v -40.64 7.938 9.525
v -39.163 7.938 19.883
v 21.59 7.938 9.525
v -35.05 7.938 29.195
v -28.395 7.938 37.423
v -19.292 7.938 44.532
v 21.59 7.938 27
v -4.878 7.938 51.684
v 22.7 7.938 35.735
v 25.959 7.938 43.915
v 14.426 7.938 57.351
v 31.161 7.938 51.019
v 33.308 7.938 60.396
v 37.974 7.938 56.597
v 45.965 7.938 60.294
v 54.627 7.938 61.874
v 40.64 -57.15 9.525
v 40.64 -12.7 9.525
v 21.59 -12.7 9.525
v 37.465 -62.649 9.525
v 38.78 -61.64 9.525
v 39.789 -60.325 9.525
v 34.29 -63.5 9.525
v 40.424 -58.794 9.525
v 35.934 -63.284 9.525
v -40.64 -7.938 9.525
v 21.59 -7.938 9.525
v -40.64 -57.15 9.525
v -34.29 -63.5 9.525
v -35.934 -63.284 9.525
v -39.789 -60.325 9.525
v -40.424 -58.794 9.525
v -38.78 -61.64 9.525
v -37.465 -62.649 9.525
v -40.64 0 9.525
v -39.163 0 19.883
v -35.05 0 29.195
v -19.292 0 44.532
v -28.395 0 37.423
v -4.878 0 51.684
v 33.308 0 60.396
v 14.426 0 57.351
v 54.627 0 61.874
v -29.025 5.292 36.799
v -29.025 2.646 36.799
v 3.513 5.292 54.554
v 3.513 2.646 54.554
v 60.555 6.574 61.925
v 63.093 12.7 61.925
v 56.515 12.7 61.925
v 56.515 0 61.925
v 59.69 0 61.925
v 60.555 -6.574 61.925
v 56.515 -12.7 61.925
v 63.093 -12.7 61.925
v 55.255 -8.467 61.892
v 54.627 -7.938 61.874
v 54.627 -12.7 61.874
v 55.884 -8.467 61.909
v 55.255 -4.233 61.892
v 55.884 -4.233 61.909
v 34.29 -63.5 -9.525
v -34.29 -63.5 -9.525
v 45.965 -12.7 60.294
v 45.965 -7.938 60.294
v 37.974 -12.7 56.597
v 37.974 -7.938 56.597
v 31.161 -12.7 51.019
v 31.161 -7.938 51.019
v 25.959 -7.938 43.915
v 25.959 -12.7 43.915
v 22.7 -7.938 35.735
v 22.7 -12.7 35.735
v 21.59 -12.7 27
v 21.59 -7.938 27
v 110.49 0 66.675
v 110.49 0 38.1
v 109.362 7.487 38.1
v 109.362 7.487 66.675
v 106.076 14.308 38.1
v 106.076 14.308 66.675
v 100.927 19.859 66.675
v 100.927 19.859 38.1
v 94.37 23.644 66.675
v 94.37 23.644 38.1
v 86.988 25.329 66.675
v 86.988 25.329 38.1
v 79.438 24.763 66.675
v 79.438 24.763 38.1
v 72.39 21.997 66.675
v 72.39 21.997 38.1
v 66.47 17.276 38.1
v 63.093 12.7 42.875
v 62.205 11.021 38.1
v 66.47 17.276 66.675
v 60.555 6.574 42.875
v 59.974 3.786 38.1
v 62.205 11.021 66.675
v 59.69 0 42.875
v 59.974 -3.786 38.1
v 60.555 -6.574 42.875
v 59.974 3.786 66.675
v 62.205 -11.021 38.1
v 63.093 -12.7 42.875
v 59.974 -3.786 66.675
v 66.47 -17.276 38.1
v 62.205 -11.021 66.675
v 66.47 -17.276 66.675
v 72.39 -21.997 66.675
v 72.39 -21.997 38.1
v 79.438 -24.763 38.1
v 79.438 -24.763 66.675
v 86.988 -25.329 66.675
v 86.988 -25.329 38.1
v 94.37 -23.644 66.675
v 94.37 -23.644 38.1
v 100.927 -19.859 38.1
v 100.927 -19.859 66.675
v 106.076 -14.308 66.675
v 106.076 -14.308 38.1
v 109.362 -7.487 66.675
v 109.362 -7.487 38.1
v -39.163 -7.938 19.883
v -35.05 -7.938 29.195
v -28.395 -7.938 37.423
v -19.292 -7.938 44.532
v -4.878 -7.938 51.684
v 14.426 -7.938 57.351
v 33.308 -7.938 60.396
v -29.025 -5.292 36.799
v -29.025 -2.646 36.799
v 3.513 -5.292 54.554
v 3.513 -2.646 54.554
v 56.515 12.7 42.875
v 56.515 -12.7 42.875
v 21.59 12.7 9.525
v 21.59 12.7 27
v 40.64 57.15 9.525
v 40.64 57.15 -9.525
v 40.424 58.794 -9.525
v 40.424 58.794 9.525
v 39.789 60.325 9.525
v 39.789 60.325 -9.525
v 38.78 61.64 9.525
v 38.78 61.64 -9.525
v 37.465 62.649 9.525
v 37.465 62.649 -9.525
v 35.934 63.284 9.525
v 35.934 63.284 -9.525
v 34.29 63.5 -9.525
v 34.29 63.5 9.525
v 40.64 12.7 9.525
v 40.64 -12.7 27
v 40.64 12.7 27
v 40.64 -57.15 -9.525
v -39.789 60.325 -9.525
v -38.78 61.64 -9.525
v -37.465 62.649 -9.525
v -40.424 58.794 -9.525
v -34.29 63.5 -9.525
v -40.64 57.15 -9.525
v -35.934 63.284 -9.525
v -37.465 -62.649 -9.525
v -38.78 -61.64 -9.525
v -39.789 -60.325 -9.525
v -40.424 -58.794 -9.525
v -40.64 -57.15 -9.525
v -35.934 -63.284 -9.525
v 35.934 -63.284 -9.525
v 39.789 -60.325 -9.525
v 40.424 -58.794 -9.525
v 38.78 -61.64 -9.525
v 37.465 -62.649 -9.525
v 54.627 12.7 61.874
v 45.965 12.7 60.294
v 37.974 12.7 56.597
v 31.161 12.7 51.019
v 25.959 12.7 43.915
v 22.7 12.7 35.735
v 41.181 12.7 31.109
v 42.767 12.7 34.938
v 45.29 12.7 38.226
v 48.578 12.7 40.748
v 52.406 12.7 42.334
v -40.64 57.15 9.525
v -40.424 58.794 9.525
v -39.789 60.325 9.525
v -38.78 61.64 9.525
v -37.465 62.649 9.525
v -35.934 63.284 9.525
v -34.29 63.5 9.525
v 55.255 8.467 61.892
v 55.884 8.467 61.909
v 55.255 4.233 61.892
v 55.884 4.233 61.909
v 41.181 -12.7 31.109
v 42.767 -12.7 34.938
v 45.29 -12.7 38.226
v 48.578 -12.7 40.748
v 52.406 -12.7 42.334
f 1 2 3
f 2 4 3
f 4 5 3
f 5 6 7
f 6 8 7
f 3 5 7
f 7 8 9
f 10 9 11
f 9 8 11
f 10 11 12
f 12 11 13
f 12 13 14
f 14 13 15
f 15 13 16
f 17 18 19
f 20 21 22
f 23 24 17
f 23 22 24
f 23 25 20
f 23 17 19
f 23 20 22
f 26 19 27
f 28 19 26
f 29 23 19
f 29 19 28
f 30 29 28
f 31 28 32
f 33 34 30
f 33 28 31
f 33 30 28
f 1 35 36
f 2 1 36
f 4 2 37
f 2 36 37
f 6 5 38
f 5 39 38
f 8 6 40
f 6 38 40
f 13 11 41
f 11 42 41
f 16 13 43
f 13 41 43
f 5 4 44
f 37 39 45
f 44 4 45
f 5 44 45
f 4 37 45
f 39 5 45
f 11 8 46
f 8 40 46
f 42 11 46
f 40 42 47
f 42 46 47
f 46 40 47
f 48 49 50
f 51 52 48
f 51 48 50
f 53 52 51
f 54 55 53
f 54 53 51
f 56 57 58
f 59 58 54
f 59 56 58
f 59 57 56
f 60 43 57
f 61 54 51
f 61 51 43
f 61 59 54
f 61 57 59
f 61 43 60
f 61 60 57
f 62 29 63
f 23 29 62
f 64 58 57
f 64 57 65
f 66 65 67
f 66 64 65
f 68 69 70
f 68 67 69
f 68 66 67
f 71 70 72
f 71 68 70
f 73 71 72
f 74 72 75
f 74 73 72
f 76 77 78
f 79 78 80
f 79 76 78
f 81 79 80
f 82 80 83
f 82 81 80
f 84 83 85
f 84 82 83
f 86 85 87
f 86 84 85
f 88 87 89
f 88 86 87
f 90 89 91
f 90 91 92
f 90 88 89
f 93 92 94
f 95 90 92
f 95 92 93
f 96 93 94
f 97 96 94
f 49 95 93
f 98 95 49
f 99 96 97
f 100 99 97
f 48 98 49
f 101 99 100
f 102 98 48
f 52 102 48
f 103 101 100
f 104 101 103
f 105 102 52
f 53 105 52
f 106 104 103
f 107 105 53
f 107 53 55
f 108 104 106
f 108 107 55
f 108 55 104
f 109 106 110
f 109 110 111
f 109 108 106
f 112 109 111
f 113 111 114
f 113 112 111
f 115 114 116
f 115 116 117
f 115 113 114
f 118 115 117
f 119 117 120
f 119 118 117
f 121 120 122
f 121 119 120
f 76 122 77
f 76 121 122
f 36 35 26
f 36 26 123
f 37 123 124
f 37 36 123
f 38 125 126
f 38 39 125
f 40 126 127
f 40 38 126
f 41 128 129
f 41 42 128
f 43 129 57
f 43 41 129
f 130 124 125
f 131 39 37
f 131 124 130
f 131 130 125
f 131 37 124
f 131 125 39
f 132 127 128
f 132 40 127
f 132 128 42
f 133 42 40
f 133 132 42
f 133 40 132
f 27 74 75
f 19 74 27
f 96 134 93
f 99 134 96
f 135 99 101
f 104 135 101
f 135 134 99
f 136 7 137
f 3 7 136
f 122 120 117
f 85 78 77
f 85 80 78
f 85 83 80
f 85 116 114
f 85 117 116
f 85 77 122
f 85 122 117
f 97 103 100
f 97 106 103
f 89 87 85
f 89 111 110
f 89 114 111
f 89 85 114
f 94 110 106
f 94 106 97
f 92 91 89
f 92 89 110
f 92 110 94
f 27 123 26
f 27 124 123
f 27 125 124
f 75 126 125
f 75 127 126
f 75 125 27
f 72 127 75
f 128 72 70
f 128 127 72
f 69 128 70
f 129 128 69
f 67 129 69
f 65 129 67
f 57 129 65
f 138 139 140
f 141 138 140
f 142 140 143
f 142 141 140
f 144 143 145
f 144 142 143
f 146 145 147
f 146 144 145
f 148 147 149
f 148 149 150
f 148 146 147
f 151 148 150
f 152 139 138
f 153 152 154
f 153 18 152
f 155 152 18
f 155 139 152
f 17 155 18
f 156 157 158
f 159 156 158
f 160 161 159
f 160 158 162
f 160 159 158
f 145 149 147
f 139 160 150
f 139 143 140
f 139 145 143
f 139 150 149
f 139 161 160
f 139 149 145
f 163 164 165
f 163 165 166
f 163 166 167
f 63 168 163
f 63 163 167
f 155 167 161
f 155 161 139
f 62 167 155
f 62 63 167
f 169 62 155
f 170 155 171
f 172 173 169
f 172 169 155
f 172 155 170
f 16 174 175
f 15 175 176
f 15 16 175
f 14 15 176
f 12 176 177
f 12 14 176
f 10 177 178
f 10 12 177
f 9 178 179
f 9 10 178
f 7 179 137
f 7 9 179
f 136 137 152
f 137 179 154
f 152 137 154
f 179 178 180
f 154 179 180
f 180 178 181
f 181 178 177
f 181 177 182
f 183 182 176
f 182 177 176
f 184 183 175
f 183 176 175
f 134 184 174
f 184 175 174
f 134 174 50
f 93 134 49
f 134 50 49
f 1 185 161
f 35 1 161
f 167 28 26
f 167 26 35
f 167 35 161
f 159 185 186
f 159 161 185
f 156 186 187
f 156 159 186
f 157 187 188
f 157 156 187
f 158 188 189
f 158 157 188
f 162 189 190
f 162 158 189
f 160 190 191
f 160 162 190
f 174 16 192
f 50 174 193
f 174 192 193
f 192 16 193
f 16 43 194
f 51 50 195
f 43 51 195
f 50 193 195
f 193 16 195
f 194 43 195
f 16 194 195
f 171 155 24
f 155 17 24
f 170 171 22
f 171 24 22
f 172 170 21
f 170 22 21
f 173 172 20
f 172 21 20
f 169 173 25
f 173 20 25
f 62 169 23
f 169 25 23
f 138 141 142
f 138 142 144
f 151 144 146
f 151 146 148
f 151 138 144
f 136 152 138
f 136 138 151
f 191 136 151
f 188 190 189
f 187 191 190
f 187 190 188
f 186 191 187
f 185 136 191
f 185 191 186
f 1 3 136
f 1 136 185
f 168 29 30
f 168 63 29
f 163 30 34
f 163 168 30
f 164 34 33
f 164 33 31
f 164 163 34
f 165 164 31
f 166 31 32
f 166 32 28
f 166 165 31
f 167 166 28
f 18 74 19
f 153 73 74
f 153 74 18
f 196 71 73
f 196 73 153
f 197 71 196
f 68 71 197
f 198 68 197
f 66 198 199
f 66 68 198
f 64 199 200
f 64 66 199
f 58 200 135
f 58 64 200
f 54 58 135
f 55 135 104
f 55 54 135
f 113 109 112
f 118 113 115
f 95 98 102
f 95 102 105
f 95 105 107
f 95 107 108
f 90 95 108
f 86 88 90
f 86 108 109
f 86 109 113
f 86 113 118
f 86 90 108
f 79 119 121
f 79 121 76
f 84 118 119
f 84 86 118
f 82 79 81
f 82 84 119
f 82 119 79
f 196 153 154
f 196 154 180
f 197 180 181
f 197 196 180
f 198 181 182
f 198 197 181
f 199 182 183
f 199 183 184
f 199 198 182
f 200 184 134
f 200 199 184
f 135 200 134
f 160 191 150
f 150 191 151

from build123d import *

# Parameters (mm, degrees)
F1_DEPTH = 63.5
F0_W     = 25.4
F0_H     = 19.05
F2_DEPTH = 12.7
F3_DEPTH = 7.9375
F5_R     = 6.35
F6_R     = 6.35
F7_R     = 6.35


with BuildPart() as f1:
    # F0 (on Front) → F1 (new body, symmetric)
    with BuildSketch(Plane.XZ):
        Polygon((40.64, -9.525), (40.64, 9.525), (21.59, 9.525), (-40.64, 9.525), (-40.64, -9.525), align=None)
    extrude(amount=F1_DEPTH, both=True)

    # F0 (on Front) → F2 (join, symmetric)
    with BuildSketch(Plane.XZ):
        with BuildLine():
            Line((21.59, 9.525), (40.64, 9.525))
            Line((40.64, 9.525), (40.64, 27.0002))
            ThreePointArc((40.64, 27.0002), (45.2896798487, 38.2255201513), (56.515, 42.8752))
            Line((56.515, 42.8752), (59.69, 42.8752))
            Line((59.69, 42.8752), (59.69, 61.9252))
            Line((59.69, 61.9252), (56.515, 61.9252))
            add(Edge.make_bspline(
                [(54.6273008741, 61.8741475398), (55.2538493606, 61.8930466239), (55.8830864872, 61.910065703), (56.515, 61.9252)],
                knots=[109.2371612745, 109.2371612745, 109.2371612745, 109.2371612745, 110.3851212122, 110.3851212122, 110.3851212122, 110.3851212122], degree=3))
            ThreePointArc((54.6273008741, 61.8741475398), (31.1606757438, 51.01923134), (21.59, 27.0002))
            Line((21.59, 27.0002), (21.59, 9.525))
        make_face()
        with Locations((72.39, 52.4002)):
            Rectangle(F0_W, F0_H)
    extrude(amount=F2_DEPTH, both=True)

    # F0 (on Front) → F3 (join, symmetric)
    with BuildSketch(Plane.XZ):
        with BuildLine():
            Line((-40.64, 9.525), (21.59, 9.525))
            Line((21.59, 9.525), (21.59, 27.0002))
            ThreePointArc((21.59, 27.0002), (31.1606757438, 51.01923134), (54.6273008741, 61.8741475398))
            add(Edge.make_bspline(
                [(-40.64, 9.525), (-40.2688790692, 41.2539616871), (-4.9935759741, 60.0757552579), (54.6273008741, 61.8741475398)],
                knots=[0, 0, 0, 0, 109.2371612745, 109.2371612745, 109.2371612745, 109.2371612745], degree=3))
        make_face()
    extrude(amount=F3_DEPTH, both=True)

    # F0 (on Front) → F4 (revolve)
    with BuildSketch(Plane.XZ):
        Polygon((85.09, 61.9252), (85.09, 42.8752), (85.09, 38.1), (110.49, 38.1), (110.49, 66.675), (85.09, 66.675), align=None)
    revolve(axis=Axis((85.09, 0, 52.3875), (0, 0, 1)))

    # F5
    f5_edges = [f1.edges().sort_by_distance(p)[0] for p in [
        (40.64, -63.5, 0),
    ]]
    fillet(f5_edges, radius=F5_R)

    # F6
    f6_edges = [f1.edges().sort_by_distance(p)[0] for p in [
        (-40.64, -63.5, 0),
    ]]
    fillet(f6_edges, radius=F6_R)

    # F7
    f7_edges = [f1.edges().sort_by_distance(p)[0] for p in [
        (40.64, 63.5, 0),
        (-40.64, 63.5, 0),
    ]]
    fillet(f7_edges, radius=F7_R)


solid = f1.part
